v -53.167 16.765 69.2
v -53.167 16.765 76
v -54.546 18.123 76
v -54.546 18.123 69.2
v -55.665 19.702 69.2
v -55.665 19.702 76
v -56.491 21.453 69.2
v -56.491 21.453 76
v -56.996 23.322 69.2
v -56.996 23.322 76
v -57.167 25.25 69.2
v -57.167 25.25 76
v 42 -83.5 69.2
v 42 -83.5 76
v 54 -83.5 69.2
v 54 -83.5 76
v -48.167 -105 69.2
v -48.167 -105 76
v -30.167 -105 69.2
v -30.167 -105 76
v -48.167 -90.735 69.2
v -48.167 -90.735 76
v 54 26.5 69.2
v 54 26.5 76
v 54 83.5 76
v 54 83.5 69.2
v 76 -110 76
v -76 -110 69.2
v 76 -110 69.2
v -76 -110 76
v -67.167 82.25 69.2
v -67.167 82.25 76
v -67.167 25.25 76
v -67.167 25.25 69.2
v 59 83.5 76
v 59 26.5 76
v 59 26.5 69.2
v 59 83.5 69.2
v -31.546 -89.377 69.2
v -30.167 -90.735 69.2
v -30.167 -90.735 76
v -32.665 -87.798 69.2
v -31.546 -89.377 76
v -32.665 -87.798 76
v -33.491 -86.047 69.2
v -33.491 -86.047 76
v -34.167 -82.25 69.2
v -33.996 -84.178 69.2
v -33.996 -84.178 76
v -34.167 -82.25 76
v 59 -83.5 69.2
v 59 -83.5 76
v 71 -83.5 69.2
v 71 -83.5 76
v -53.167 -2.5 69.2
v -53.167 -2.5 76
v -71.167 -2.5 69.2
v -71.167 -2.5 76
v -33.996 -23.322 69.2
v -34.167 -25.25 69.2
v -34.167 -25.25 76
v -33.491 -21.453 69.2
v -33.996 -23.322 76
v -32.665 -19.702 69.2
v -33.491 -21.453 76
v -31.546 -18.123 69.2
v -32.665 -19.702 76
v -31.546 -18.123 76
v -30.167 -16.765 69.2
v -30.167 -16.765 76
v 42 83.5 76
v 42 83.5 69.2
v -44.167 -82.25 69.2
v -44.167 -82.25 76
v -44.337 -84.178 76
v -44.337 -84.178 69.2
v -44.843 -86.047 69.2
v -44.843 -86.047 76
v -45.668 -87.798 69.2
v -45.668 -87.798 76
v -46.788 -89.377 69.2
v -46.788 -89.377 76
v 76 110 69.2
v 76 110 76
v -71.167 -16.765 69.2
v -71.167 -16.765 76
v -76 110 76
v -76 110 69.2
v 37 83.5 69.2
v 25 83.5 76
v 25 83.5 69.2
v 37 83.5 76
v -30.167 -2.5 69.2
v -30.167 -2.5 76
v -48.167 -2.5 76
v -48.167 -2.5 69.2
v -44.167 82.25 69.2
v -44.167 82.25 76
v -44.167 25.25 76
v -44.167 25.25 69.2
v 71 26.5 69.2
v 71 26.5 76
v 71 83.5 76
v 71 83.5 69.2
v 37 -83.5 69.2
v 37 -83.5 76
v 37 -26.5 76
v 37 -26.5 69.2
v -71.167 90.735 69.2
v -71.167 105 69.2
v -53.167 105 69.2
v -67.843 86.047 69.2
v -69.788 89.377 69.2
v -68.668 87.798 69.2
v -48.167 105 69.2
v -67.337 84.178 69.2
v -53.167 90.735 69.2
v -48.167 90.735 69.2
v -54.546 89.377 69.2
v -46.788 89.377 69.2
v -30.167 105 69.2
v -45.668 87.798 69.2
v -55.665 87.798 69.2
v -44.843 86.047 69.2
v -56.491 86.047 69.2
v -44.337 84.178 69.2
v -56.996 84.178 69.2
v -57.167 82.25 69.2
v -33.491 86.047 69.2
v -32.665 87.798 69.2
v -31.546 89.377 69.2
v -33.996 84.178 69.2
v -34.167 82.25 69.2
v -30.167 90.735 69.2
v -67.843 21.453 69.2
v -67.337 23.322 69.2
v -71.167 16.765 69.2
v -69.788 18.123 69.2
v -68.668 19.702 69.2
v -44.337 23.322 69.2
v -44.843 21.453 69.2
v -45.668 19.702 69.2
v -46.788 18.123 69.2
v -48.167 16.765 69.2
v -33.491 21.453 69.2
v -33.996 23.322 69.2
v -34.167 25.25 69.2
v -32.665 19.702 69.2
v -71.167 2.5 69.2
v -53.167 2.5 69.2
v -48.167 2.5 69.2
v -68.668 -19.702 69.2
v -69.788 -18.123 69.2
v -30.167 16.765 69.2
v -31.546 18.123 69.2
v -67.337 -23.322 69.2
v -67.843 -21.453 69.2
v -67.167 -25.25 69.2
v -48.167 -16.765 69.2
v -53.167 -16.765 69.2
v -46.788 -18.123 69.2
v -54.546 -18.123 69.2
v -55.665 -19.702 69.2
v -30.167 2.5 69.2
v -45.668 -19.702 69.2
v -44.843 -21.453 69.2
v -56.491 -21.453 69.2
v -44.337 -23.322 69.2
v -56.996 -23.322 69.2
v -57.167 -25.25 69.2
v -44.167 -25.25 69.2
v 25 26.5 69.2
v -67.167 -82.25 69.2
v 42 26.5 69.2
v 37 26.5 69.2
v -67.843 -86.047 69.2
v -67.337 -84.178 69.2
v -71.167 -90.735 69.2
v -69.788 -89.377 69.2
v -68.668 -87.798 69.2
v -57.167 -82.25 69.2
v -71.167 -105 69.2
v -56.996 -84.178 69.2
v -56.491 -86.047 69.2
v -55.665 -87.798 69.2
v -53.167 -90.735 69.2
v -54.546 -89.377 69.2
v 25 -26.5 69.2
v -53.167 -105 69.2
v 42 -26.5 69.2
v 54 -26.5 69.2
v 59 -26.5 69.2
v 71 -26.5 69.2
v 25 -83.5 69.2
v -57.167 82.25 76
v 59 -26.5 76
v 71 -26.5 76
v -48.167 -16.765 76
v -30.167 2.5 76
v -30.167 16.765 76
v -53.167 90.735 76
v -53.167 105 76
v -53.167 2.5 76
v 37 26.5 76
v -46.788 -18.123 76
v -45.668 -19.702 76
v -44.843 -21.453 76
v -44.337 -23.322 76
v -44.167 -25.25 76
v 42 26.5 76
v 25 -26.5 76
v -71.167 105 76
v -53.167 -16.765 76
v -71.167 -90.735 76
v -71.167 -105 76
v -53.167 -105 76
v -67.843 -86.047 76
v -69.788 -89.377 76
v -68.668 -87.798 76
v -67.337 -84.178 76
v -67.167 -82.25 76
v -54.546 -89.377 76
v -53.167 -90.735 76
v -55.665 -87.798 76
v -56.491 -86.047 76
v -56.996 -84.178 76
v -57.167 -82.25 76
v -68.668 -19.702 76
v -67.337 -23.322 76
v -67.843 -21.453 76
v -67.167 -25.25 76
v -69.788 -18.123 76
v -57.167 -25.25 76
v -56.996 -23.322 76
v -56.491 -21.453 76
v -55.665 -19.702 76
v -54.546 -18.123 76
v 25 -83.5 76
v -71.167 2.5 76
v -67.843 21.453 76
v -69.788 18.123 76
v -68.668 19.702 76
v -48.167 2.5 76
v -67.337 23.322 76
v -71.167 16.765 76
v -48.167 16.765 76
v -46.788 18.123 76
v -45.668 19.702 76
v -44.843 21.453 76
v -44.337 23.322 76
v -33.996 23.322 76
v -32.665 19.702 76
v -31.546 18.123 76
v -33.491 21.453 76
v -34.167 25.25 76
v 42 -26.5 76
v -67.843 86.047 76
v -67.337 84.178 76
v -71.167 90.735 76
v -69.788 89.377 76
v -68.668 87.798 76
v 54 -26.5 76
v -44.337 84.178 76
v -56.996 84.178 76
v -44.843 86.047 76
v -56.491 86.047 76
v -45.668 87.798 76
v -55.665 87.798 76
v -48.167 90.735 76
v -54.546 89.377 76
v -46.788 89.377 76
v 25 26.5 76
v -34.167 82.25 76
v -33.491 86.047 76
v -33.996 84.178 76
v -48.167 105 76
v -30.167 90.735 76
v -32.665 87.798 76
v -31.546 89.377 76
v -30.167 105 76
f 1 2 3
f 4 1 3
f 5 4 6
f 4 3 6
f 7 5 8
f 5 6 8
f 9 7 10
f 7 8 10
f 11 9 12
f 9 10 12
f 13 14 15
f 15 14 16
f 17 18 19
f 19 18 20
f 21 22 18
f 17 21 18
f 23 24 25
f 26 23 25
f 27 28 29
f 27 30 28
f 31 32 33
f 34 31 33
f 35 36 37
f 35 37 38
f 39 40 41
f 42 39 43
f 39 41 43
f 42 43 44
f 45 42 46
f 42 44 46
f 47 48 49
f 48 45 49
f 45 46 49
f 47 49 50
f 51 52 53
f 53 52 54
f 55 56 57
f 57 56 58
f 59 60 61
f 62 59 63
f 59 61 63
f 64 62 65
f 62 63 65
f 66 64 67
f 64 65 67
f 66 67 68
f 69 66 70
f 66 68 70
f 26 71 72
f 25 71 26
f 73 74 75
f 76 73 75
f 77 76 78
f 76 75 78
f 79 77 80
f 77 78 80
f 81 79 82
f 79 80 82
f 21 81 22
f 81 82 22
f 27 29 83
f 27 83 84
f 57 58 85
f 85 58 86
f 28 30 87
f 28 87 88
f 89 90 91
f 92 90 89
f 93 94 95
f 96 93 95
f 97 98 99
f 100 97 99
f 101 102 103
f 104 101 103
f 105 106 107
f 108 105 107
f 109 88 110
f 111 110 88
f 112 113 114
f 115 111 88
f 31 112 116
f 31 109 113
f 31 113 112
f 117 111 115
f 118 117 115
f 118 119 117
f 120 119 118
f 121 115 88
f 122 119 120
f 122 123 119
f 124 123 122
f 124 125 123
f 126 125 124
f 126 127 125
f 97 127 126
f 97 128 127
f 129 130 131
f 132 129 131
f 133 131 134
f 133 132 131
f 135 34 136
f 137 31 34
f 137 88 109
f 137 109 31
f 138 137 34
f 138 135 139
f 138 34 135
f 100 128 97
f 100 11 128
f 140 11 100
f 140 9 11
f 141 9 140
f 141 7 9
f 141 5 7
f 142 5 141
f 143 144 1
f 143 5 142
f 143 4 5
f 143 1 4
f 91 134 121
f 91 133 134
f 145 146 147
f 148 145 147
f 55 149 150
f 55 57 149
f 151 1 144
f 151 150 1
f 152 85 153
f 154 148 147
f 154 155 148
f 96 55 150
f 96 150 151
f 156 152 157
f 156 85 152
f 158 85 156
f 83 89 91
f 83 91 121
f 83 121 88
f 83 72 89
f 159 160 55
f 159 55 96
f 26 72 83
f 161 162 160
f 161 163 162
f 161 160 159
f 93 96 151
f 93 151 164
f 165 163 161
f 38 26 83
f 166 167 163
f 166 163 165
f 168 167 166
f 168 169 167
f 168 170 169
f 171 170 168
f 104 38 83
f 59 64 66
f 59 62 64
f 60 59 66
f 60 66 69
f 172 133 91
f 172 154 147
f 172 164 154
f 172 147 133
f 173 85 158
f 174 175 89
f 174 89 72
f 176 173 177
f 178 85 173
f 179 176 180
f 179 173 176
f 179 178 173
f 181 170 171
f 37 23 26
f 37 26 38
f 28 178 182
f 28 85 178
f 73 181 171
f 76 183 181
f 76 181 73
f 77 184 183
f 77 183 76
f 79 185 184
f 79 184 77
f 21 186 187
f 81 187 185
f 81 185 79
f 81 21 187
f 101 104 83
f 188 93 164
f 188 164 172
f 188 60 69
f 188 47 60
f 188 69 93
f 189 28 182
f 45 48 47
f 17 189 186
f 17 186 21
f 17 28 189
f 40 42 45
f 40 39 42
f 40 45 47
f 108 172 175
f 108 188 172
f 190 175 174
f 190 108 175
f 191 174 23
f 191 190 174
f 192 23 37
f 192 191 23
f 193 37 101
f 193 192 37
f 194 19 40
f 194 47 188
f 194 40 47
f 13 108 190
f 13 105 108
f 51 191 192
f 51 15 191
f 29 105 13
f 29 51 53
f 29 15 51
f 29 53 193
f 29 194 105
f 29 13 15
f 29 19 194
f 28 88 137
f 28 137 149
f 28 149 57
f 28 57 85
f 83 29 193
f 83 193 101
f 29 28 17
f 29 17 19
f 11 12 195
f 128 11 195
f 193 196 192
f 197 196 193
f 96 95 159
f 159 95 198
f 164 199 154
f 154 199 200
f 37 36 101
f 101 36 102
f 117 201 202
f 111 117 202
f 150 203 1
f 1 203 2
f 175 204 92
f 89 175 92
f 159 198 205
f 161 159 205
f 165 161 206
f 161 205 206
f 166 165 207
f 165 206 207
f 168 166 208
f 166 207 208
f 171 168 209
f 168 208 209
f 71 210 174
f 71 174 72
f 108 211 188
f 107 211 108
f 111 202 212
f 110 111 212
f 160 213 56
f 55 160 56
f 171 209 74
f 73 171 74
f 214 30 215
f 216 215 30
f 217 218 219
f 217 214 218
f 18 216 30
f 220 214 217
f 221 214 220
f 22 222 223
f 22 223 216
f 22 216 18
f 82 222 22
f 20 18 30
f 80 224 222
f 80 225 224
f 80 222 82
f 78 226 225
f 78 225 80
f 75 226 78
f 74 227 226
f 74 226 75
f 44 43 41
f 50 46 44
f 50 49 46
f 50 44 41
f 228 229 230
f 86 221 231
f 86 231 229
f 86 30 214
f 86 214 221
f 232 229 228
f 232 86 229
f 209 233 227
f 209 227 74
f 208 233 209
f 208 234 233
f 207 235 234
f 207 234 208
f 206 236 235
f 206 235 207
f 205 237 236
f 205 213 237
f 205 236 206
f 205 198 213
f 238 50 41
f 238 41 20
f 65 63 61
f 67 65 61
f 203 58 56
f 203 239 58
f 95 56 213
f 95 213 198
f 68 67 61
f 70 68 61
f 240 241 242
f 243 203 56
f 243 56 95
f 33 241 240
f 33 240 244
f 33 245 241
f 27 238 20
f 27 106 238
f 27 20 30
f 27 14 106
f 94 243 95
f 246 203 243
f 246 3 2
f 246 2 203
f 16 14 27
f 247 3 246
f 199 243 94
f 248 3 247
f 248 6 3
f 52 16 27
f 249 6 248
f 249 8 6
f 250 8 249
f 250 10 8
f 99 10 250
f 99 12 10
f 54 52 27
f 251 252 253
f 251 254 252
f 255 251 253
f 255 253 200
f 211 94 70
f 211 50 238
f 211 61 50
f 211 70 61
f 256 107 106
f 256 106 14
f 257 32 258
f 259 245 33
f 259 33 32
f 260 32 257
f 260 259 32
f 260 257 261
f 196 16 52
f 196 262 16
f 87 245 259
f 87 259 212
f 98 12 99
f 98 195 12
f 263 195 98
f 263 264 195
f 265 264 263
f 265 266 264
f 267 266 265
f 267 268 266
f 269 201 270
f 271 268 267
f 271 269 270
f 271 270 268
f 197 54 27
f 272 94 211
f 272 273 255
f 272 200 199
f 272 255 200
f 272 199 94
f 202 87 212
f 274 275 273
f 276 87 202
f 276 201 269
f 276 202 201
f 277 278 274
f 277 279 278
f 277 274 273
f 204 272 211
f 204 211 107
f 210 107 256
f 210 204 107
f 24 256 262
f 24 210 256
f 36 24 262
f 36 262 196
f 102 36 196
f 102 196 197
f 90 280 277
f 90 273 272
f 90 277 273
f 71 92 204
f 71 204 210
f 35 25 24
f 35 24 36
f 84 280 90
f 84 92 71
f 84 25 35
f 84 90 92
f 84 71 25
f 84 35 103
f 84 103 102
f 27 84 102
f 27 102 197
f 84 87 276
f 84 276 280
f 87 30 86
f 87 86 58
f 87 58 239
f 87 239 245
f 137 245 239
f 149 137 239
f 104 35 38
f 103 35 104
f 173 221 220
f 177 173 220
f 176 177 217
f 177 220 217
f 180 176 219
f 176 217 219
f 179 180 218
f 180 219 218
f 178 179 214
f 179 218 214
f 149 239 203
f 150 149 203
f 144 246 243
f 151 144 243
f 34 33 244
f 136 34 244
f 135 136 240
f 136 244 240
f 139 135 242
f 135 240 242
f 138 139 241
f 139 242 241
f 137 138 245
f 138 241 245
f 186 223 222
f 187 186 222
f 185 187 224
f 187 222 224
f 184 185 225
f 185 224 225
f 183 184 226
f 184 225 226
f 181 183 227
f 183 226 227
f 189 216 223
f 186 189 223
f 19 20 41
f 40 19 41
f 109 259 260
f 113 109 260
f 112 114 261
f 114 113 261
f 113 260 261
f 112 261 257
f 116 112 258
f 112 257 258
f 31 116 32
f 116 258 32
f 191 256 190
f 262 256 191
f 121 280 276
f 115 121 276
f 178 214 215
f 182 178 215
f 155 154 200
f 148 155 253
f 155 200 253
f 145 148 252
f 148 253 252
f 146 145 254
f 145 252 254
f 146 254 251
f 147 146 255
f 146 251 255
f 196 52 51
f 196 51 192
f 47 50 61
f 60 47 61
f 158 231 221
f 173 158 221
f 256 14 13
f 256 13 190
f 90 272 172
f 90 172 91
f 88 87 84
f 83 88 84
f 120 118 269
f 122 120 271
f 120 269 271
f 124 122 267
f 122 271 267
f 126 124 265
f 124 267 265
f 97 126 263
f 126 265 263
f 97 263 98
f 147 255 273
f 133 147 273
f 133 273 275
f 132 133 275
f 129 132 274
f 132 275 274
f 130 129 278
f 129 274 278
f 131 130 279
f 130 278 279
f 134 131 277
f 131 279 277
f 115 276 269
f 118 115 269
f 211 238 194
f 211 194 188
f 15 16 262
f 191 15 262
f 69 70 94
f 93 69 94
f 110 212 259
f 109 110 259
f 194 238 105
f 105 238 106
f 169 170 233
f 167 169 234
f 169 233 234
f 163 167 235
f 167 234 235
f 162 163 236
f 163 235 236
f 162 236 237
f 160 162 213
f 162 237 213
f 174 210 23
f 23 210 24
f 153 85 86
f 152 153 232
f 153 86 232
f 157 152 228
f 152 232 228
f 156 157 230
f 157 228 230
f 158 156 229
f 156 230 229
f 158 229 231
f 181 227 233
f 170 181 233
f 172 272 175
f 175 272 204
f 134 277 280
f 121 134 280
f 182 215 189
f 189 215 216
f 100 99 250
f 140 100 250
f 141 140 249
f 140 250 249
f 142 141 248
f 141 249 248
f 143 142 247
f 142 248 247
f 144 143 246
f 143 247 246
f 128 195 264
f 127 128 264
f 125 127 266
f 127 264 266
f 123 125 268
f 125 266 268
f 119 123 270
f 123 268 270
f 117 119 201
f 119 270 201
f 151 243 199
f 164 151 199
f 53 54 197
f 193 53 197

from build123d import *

# Parameters (mm, degrees)
F1_DEPTH = 110
F2_W     = 76
F2_H     = 8
F3_DEPTH = 152
F4_W     = 12
F4_H     = 57
F5_DEPTH = 152
F6_W     = 152
F6_H     = 220
F6_W_2   = 12
F6_H_2   = 57
F7_DEPTH = 145.2


# Not quite as in the source:
# - a feature names something its author has since deleted; it is built from what else it names


with BuildPart() as f1:
    # F0 (on Front) → F1 (new body, symmetric)
    with BuildSketch(Plane.XZ):
        with BuildLine():
            ThreePointArc((11.95, -69.2), (5.6567496474, -66.5932503526), (3.05, -60.3))
            Line((3.05, -60.3), (3.05, 60.3))
            ThreePointArc((3.05, 60.3), (5.6567496474, 66.5932503526), (11.95, 69.2))
            Line((11.95, 69.2), (76, 69.2))
            Line((76, 69.2), (76, 76))
            Line((76, 76), (-76, 76))
            Line((-76, 76), (-76, 69.2))
            Line((-76, 69.2), (-11.95, 69.2))
            ThreePointArc((-11.95, 69.2), (-5.6567496474, 66.5932503526), (-3.05, 60.3))
            Line((-3.05, 60.3), (-3.05, -60.3))
            ThreePointArc((-3.05, -60.3), (-5.6567496474, -66.5932503526), (-11.95, -69.2))
            Line((-11.95, -69.2), (-76, -69.2))
            Line((-76, -69.2), (-76, -76))
            Line((-76, -76), (76, -76))
            Line((76, -76), (76, -69.2))
            Line((76, -69.2), (11.95, -69.2))
        make_face()
    extrude(amount=F1_DEPTH, both=True)

    # F2 (on face) → F3 (join)
    with BuildSketch(Plane.XY.offset(76)):
        with Locations((-38, 0)):
            Rectangle(F2_W, F2_H)
    extrude(amount=-F3_DEPTH)

    # F4 (on face) → F5 (cut)
    with BuildSketch(Plane.XY.offset(76)):
        with BuildLine():
            ThreePointArc((-48.16667, 90.7352813742), (-45.2167956289, 86.9404157598), (-44.16667, 82.25))
            Line((-44.16667, 82.25), (-44.16667, 25.25))
            ThreePointArc((-44.16667, 25.25), (-45.2167956289, 20.5595842402), (-48.16667, 16.7647186258))
            Line((-48.16667, 16.7647186258), (-48.16667, 2.5))
            Line((-48.16667, 2.5), (-30.16667, 2.5))
            Line((-30.16667, 2.5), (-30.16667, 16.7647186258))
            ThreePointArc((-30.16667, 16.7647186258), (-33.1165443711, 20.5595842402), (-34.16667, 25.25))
            Line((-34.16667, 25.25), (-34.16667, 82.25))
            ThreePointArc((-34.16667, 82.25), (-33.1165443711, 86.9404157598), (-30.16667, 90.7352813742))
            Line((-30.16667, 90.7352813742), (-30.16667, 105))
            Line((-30.16667, 105), (-48.16667, 105))
            Line((-48.16667, 105), (-48.16667, 90.7352813742))
        make_face()
        with BuildLine():
            Line((-71.16667, 2.5), (-53.16667, 2.5))
            Line((-53.16667, 2.5), (-53.16667, 16.7647186258))
            ThreePointArc((-53.16667, 16.7647186258), (-56.1165443711, 20.5595842402), (-57.16667, 25.25))
            Line((-57.16667, 25.25), (-57.16667, 82.25))
            ThreePointArc((-57.16667, 82.25), (-56.1165443711, 86.9404157598), (-53.16667, 90.7352813742))
            Line((-53.16667, 90.7352813742), (-53.16667, 105))
            Line((-53.16667, 105), (-71.16667, 105))
            Line((-71.16667, 105), (-71.16667, 90.7352813742))
            ThreePointArc((-71.16667, 90.7352813742), (-68.2167956289, 86.9404157598), (-67.16667, 82.25))
            Line((-67.16667, 82.25), (-67.16667, 25.25))
            ThreePointArc((-67.16667, 25.25), (-68.2167956289, 20.5595842402), (-71.16667, 16.7647186258))
            Line((-71.16667, 16.7647186258), (-71.16667, 2.5))
        make_face()
        with Locations((31, 55)):
            Rectangle(F4_W, F4_H)
        with Locations((48, 55)):
            Rectangle(F4_W, F4_H)
        with Locations((65, 55)):
            Rectangle(F4_W, F4_H)
        with Locations((31, -55)):
            Rectangle(F4_W, F4_H)
        with Locations((48, -55)):
            Rectangle(F4_W, F4_H)
        with Locations((65, -55)):
            Rectangle(F4_W, F4_H)
        with BuildLine():
            Line((-71.16667, -105), (-53.16667, -105))
            Line((-53.16667, -105), (-53.16667, -90.7352813742))
            ThreePointArc((-53.16667, -90.7352813742), (-56.1165443711, -86.9404157598), (-57.16667, -82.25))
            Line((-57.16667, -82.25), (-57.16667, -25.25))
            ThreePointArc((-57.16667, -25.25), (-56.1165443711, -20.5595842402), (-53.16667, -16.7647186258))
            Line((-53.16667, -16.7647186258), (-53.16667, -2.5))
            Line((-53.16667, -2.5), (-71.16667, -2.5))
            Line((-71.16667, -2.5), (-71.16667, -16.7647186258))
            ThreePointArc((-71.16667, -16.7647186258), (-68.2167956289, -20.5595842402), (-67.16667, -25.25))
            Line((-67.16667, -25.25), (-67.16667, -82.25))
            ThreePointArc((-67.16667, -82.25), (-68.2167956289, -86.9404157598), (-71.16667, -90.7352813742))
            Line((-71.16667, -90.7352813742), (-71.16667, -105))
        make_face()
        with BuildLine():
            ThreePointArc((-48.16667, -16.7647186258), (-45.2167956289, -20.5595842402), (-44.16667, -25.25))
            Line((-44.16667, -25.25), (-44.16667, -82.25))
            ThreePointArc((-44.16667, -82.25), (-45.2167956289, -86.9404157598), (-48.16667, -90.7352813742))
            Line((-48.16667, -90.7352813742), (-48.16667, -105))
            Line((-48.16667, -105), (-30.16667, -105))
            Line((-30.16667, -105), (-30.16667, -90.7352813742))
            ThreePointArc((-30.16667, -90.7352813742), (-33.1165443711, -86.9404157598), (-34.16667, -82.25))
            Line((-34.16667, -82.25), (-34.16667, -25.25))
            ThreePointArc((-34.16667, -25.25), (-33.1165443711, -20.5595842402), (-30.16667, -16.7647186258))
            Line((-30.16667, -16.7647186258), (-30.16667, -2.5))
            Line((-30.16667, -2.5), (-48.16667, -2.5))
            Line((-48.16667, -2.5), (-48.16667, -16.7647186258))
        make_face()
    extrude(amount=-F5_DEPTH, mode=Mode.SUBTRACT)

    # F6 (on face) → F7 (cut)
    with BuildSketch(Plane(origin=(0, 0, -76), x_dir=(1, 0, 0), z_dir=(0, 0, -1))):
        Rectangle(F6_W, F6_H)
        with BuildLine():
            Line((-67.16667, -82.25), (-67.16667, -25.25))
            ThreePointArc((-67.16667, -25.25), (-68.2167956289, -20.5595842402), (-71.16667, -16.7647186258))
            Line((-71.16667, -16.7647186258), (-71.16667, -2.5))
            Line((-71.16667, -2.5), (-53.16667, -2.5))
            Line((-53.16667, -2.5), (-53.16667, -16.7647186258))
            ThreePointArc((-53.16667, -16.7647186258), (-56.1165443711, -20.5595842402), (-57.16667, -25.25))
            Line((-57.16667, -25.25), (-57.16667, -82.25))
            ThreePointArc((-57.16667, -82.25), (-56.1165443711, -86.9404157598), (-53.16667, -90.7352813742))
            Line((-53.16667, -90.7352813742), (-53.16667, -105))
            Line((-53.16667, -105), (-71.16667, -105))
            Line((-71.16667, -105), (-71.16667, -90.7352813742))
            ThreePointArc((-71.16667, -90.7352813742), (-68.2167956289, -86.9404157598), (-67.16667, -82.25))
        make_face(mode=Mode.SUBTRACT)
        with BuildLine():
            Line((-30.16667, -105), (-48.16667, -105))
            Line((-48.16667, -105), (-48.16667, -90.7352813742))
            ThreePointArc((-48.16667, -90.7352813742), (-45.2167956289, -86.9404157598), (-44.16667, -82.25))
            Line((-44.16667, -82.25), (-44.16667, -25.25))
            ThreePointArc((-44.16667, -25.25), (-45.2167956289, -20.5595842402), (-48.16667, -16.7647186258))
            Line((-48.16667, -16.7647186258), (-48.16667, -2.5))
            Line((-48.16667, -2.5), (-30.16667, -2.5))
            Line((-30.16667, -2.5), (-30.16667, -16.7647186258))
            ThreePointArc((-30.16667, -16.7647186258), (-33.1165443711, -20.5595842402), (-34.16667, -25.25))
            Line((-34.16667, -25.25), (-34.16667, -82.25))
            ThreePointArc((-34.16667, -82.25), (-33.1165443711, -86.9404157598), (-30.16667, -90.7352813742))
            Line((-30.16667, -90.7352813742), (-30.16667, -105))
        make_face(mode=Mode.SUBTRACT)
        with Locations((31, -55)):
            Rectangle(F6_W_2, F6_H_2, mode=Mode.SUBTRACT)
        with Locations((48, -55)):
            Rectangle(F6_W_2, F6_H_2, mode=Mode.SUBTRACT)
        with Locations((65, -55)):
            Rectangle(F6_W_2, F6_H_2, mode=Mode.SUBTRACT)
        with BuildLine():
            ThreePointArc((-67.16667, 82.25), (-68.2167956289, 86.9404157598), (-71.16667, 90.7352813742))
            Line((-71.16667, 90.7352813742), (-71.16667, 105))
            Line((-71.16667, 105), (-53.16667, 105))
            Line((-53.16667, 105), (-53.16667, 90.7352813742))
            ThreePointArc((-53.16667, 90.7352813742), (-56.1165443711, 86.9404157598), (-57.16667, 82.25))
            Line((-57.16667, 82.25), (-57.16667, 25.25))
            ThreePointArc((-57.16667, 25.25), (-56.1165443711, 20.5595842402), (-53.16667, 16.7647186258))
            Line((-53.16667, 16.7647186258), (-53.16667, 2.5))
            Line((-53.16667, 2.5), (-71.16667, 2.5))
            Line((-71.16667, 2.5), (-71.16667, 16.7647186258))
            ThreePointArc((-71.16667, 16.7647186258), (-68.2167956289, 20.5595842402), (-67.16667, 25.25))
            Line((-67.16667, 25.25), (-67.16667, 82.25))
        make_face(mode=Mode.SUBTRACT)
        with BuildLine():
            Line((-30.16667, 2.5), (-48.16667, 2.5))
            Line((-48.16667, 2.5), (-48.16667, 16.7647186258))
            ThreePointArc((-48.16667, 16.7647186258), (-45.2167956289, 20.5595842402), (-44.16667, 25.25))
            Line((-44.16667, 25.25), (-44.16667, 82.25))
            ThreePointArc((-44.16667, 82.25), (-45.2167956289, 86.9404157598), (-48.16667, 90.7352813742))
            Line((-48.16667, 90.7352813742), (-48.16667, 105))
            Line((-48.16667, 105), (-30.16667, 105))
            Line((-30.16667, 105), (-30.16667, 90.7352813742))
            ThreePointArc((-30.16667, 90.7352813742), (-33.1165443711, 86.9404157598), (-34.16667, 82.25))
            Line((-34.16667, 82.25), (-34.16667, 25.25))
            ThreePointArc((-34.16667, 25.25), (-33.1165443711, 20.5595842402), (-30.16667, 16.7647186258))
            Line((-30.16667, 16.7647186258), (-30.16667, 2.5))
        make_face(mode=Mode.SUBTRACT)
        with Locations((31, 55)):
            Rectangle(F6_W_2, F6_H_2, mode=Mode.SUBTRACT)
        with Locations((48, 55)):
            Rectangle(F6_W_2, F6_H_2, mode=Mode.SUBTRACT)
        with Locations((65, 55)):
            Rectangle(F6_W_2, F6_H_2, mode=Mode.SUBTRACT)
    extrude(amount=-F7_DEPTH, mode=Mode.SUBTRACT)


solid = f1.part
